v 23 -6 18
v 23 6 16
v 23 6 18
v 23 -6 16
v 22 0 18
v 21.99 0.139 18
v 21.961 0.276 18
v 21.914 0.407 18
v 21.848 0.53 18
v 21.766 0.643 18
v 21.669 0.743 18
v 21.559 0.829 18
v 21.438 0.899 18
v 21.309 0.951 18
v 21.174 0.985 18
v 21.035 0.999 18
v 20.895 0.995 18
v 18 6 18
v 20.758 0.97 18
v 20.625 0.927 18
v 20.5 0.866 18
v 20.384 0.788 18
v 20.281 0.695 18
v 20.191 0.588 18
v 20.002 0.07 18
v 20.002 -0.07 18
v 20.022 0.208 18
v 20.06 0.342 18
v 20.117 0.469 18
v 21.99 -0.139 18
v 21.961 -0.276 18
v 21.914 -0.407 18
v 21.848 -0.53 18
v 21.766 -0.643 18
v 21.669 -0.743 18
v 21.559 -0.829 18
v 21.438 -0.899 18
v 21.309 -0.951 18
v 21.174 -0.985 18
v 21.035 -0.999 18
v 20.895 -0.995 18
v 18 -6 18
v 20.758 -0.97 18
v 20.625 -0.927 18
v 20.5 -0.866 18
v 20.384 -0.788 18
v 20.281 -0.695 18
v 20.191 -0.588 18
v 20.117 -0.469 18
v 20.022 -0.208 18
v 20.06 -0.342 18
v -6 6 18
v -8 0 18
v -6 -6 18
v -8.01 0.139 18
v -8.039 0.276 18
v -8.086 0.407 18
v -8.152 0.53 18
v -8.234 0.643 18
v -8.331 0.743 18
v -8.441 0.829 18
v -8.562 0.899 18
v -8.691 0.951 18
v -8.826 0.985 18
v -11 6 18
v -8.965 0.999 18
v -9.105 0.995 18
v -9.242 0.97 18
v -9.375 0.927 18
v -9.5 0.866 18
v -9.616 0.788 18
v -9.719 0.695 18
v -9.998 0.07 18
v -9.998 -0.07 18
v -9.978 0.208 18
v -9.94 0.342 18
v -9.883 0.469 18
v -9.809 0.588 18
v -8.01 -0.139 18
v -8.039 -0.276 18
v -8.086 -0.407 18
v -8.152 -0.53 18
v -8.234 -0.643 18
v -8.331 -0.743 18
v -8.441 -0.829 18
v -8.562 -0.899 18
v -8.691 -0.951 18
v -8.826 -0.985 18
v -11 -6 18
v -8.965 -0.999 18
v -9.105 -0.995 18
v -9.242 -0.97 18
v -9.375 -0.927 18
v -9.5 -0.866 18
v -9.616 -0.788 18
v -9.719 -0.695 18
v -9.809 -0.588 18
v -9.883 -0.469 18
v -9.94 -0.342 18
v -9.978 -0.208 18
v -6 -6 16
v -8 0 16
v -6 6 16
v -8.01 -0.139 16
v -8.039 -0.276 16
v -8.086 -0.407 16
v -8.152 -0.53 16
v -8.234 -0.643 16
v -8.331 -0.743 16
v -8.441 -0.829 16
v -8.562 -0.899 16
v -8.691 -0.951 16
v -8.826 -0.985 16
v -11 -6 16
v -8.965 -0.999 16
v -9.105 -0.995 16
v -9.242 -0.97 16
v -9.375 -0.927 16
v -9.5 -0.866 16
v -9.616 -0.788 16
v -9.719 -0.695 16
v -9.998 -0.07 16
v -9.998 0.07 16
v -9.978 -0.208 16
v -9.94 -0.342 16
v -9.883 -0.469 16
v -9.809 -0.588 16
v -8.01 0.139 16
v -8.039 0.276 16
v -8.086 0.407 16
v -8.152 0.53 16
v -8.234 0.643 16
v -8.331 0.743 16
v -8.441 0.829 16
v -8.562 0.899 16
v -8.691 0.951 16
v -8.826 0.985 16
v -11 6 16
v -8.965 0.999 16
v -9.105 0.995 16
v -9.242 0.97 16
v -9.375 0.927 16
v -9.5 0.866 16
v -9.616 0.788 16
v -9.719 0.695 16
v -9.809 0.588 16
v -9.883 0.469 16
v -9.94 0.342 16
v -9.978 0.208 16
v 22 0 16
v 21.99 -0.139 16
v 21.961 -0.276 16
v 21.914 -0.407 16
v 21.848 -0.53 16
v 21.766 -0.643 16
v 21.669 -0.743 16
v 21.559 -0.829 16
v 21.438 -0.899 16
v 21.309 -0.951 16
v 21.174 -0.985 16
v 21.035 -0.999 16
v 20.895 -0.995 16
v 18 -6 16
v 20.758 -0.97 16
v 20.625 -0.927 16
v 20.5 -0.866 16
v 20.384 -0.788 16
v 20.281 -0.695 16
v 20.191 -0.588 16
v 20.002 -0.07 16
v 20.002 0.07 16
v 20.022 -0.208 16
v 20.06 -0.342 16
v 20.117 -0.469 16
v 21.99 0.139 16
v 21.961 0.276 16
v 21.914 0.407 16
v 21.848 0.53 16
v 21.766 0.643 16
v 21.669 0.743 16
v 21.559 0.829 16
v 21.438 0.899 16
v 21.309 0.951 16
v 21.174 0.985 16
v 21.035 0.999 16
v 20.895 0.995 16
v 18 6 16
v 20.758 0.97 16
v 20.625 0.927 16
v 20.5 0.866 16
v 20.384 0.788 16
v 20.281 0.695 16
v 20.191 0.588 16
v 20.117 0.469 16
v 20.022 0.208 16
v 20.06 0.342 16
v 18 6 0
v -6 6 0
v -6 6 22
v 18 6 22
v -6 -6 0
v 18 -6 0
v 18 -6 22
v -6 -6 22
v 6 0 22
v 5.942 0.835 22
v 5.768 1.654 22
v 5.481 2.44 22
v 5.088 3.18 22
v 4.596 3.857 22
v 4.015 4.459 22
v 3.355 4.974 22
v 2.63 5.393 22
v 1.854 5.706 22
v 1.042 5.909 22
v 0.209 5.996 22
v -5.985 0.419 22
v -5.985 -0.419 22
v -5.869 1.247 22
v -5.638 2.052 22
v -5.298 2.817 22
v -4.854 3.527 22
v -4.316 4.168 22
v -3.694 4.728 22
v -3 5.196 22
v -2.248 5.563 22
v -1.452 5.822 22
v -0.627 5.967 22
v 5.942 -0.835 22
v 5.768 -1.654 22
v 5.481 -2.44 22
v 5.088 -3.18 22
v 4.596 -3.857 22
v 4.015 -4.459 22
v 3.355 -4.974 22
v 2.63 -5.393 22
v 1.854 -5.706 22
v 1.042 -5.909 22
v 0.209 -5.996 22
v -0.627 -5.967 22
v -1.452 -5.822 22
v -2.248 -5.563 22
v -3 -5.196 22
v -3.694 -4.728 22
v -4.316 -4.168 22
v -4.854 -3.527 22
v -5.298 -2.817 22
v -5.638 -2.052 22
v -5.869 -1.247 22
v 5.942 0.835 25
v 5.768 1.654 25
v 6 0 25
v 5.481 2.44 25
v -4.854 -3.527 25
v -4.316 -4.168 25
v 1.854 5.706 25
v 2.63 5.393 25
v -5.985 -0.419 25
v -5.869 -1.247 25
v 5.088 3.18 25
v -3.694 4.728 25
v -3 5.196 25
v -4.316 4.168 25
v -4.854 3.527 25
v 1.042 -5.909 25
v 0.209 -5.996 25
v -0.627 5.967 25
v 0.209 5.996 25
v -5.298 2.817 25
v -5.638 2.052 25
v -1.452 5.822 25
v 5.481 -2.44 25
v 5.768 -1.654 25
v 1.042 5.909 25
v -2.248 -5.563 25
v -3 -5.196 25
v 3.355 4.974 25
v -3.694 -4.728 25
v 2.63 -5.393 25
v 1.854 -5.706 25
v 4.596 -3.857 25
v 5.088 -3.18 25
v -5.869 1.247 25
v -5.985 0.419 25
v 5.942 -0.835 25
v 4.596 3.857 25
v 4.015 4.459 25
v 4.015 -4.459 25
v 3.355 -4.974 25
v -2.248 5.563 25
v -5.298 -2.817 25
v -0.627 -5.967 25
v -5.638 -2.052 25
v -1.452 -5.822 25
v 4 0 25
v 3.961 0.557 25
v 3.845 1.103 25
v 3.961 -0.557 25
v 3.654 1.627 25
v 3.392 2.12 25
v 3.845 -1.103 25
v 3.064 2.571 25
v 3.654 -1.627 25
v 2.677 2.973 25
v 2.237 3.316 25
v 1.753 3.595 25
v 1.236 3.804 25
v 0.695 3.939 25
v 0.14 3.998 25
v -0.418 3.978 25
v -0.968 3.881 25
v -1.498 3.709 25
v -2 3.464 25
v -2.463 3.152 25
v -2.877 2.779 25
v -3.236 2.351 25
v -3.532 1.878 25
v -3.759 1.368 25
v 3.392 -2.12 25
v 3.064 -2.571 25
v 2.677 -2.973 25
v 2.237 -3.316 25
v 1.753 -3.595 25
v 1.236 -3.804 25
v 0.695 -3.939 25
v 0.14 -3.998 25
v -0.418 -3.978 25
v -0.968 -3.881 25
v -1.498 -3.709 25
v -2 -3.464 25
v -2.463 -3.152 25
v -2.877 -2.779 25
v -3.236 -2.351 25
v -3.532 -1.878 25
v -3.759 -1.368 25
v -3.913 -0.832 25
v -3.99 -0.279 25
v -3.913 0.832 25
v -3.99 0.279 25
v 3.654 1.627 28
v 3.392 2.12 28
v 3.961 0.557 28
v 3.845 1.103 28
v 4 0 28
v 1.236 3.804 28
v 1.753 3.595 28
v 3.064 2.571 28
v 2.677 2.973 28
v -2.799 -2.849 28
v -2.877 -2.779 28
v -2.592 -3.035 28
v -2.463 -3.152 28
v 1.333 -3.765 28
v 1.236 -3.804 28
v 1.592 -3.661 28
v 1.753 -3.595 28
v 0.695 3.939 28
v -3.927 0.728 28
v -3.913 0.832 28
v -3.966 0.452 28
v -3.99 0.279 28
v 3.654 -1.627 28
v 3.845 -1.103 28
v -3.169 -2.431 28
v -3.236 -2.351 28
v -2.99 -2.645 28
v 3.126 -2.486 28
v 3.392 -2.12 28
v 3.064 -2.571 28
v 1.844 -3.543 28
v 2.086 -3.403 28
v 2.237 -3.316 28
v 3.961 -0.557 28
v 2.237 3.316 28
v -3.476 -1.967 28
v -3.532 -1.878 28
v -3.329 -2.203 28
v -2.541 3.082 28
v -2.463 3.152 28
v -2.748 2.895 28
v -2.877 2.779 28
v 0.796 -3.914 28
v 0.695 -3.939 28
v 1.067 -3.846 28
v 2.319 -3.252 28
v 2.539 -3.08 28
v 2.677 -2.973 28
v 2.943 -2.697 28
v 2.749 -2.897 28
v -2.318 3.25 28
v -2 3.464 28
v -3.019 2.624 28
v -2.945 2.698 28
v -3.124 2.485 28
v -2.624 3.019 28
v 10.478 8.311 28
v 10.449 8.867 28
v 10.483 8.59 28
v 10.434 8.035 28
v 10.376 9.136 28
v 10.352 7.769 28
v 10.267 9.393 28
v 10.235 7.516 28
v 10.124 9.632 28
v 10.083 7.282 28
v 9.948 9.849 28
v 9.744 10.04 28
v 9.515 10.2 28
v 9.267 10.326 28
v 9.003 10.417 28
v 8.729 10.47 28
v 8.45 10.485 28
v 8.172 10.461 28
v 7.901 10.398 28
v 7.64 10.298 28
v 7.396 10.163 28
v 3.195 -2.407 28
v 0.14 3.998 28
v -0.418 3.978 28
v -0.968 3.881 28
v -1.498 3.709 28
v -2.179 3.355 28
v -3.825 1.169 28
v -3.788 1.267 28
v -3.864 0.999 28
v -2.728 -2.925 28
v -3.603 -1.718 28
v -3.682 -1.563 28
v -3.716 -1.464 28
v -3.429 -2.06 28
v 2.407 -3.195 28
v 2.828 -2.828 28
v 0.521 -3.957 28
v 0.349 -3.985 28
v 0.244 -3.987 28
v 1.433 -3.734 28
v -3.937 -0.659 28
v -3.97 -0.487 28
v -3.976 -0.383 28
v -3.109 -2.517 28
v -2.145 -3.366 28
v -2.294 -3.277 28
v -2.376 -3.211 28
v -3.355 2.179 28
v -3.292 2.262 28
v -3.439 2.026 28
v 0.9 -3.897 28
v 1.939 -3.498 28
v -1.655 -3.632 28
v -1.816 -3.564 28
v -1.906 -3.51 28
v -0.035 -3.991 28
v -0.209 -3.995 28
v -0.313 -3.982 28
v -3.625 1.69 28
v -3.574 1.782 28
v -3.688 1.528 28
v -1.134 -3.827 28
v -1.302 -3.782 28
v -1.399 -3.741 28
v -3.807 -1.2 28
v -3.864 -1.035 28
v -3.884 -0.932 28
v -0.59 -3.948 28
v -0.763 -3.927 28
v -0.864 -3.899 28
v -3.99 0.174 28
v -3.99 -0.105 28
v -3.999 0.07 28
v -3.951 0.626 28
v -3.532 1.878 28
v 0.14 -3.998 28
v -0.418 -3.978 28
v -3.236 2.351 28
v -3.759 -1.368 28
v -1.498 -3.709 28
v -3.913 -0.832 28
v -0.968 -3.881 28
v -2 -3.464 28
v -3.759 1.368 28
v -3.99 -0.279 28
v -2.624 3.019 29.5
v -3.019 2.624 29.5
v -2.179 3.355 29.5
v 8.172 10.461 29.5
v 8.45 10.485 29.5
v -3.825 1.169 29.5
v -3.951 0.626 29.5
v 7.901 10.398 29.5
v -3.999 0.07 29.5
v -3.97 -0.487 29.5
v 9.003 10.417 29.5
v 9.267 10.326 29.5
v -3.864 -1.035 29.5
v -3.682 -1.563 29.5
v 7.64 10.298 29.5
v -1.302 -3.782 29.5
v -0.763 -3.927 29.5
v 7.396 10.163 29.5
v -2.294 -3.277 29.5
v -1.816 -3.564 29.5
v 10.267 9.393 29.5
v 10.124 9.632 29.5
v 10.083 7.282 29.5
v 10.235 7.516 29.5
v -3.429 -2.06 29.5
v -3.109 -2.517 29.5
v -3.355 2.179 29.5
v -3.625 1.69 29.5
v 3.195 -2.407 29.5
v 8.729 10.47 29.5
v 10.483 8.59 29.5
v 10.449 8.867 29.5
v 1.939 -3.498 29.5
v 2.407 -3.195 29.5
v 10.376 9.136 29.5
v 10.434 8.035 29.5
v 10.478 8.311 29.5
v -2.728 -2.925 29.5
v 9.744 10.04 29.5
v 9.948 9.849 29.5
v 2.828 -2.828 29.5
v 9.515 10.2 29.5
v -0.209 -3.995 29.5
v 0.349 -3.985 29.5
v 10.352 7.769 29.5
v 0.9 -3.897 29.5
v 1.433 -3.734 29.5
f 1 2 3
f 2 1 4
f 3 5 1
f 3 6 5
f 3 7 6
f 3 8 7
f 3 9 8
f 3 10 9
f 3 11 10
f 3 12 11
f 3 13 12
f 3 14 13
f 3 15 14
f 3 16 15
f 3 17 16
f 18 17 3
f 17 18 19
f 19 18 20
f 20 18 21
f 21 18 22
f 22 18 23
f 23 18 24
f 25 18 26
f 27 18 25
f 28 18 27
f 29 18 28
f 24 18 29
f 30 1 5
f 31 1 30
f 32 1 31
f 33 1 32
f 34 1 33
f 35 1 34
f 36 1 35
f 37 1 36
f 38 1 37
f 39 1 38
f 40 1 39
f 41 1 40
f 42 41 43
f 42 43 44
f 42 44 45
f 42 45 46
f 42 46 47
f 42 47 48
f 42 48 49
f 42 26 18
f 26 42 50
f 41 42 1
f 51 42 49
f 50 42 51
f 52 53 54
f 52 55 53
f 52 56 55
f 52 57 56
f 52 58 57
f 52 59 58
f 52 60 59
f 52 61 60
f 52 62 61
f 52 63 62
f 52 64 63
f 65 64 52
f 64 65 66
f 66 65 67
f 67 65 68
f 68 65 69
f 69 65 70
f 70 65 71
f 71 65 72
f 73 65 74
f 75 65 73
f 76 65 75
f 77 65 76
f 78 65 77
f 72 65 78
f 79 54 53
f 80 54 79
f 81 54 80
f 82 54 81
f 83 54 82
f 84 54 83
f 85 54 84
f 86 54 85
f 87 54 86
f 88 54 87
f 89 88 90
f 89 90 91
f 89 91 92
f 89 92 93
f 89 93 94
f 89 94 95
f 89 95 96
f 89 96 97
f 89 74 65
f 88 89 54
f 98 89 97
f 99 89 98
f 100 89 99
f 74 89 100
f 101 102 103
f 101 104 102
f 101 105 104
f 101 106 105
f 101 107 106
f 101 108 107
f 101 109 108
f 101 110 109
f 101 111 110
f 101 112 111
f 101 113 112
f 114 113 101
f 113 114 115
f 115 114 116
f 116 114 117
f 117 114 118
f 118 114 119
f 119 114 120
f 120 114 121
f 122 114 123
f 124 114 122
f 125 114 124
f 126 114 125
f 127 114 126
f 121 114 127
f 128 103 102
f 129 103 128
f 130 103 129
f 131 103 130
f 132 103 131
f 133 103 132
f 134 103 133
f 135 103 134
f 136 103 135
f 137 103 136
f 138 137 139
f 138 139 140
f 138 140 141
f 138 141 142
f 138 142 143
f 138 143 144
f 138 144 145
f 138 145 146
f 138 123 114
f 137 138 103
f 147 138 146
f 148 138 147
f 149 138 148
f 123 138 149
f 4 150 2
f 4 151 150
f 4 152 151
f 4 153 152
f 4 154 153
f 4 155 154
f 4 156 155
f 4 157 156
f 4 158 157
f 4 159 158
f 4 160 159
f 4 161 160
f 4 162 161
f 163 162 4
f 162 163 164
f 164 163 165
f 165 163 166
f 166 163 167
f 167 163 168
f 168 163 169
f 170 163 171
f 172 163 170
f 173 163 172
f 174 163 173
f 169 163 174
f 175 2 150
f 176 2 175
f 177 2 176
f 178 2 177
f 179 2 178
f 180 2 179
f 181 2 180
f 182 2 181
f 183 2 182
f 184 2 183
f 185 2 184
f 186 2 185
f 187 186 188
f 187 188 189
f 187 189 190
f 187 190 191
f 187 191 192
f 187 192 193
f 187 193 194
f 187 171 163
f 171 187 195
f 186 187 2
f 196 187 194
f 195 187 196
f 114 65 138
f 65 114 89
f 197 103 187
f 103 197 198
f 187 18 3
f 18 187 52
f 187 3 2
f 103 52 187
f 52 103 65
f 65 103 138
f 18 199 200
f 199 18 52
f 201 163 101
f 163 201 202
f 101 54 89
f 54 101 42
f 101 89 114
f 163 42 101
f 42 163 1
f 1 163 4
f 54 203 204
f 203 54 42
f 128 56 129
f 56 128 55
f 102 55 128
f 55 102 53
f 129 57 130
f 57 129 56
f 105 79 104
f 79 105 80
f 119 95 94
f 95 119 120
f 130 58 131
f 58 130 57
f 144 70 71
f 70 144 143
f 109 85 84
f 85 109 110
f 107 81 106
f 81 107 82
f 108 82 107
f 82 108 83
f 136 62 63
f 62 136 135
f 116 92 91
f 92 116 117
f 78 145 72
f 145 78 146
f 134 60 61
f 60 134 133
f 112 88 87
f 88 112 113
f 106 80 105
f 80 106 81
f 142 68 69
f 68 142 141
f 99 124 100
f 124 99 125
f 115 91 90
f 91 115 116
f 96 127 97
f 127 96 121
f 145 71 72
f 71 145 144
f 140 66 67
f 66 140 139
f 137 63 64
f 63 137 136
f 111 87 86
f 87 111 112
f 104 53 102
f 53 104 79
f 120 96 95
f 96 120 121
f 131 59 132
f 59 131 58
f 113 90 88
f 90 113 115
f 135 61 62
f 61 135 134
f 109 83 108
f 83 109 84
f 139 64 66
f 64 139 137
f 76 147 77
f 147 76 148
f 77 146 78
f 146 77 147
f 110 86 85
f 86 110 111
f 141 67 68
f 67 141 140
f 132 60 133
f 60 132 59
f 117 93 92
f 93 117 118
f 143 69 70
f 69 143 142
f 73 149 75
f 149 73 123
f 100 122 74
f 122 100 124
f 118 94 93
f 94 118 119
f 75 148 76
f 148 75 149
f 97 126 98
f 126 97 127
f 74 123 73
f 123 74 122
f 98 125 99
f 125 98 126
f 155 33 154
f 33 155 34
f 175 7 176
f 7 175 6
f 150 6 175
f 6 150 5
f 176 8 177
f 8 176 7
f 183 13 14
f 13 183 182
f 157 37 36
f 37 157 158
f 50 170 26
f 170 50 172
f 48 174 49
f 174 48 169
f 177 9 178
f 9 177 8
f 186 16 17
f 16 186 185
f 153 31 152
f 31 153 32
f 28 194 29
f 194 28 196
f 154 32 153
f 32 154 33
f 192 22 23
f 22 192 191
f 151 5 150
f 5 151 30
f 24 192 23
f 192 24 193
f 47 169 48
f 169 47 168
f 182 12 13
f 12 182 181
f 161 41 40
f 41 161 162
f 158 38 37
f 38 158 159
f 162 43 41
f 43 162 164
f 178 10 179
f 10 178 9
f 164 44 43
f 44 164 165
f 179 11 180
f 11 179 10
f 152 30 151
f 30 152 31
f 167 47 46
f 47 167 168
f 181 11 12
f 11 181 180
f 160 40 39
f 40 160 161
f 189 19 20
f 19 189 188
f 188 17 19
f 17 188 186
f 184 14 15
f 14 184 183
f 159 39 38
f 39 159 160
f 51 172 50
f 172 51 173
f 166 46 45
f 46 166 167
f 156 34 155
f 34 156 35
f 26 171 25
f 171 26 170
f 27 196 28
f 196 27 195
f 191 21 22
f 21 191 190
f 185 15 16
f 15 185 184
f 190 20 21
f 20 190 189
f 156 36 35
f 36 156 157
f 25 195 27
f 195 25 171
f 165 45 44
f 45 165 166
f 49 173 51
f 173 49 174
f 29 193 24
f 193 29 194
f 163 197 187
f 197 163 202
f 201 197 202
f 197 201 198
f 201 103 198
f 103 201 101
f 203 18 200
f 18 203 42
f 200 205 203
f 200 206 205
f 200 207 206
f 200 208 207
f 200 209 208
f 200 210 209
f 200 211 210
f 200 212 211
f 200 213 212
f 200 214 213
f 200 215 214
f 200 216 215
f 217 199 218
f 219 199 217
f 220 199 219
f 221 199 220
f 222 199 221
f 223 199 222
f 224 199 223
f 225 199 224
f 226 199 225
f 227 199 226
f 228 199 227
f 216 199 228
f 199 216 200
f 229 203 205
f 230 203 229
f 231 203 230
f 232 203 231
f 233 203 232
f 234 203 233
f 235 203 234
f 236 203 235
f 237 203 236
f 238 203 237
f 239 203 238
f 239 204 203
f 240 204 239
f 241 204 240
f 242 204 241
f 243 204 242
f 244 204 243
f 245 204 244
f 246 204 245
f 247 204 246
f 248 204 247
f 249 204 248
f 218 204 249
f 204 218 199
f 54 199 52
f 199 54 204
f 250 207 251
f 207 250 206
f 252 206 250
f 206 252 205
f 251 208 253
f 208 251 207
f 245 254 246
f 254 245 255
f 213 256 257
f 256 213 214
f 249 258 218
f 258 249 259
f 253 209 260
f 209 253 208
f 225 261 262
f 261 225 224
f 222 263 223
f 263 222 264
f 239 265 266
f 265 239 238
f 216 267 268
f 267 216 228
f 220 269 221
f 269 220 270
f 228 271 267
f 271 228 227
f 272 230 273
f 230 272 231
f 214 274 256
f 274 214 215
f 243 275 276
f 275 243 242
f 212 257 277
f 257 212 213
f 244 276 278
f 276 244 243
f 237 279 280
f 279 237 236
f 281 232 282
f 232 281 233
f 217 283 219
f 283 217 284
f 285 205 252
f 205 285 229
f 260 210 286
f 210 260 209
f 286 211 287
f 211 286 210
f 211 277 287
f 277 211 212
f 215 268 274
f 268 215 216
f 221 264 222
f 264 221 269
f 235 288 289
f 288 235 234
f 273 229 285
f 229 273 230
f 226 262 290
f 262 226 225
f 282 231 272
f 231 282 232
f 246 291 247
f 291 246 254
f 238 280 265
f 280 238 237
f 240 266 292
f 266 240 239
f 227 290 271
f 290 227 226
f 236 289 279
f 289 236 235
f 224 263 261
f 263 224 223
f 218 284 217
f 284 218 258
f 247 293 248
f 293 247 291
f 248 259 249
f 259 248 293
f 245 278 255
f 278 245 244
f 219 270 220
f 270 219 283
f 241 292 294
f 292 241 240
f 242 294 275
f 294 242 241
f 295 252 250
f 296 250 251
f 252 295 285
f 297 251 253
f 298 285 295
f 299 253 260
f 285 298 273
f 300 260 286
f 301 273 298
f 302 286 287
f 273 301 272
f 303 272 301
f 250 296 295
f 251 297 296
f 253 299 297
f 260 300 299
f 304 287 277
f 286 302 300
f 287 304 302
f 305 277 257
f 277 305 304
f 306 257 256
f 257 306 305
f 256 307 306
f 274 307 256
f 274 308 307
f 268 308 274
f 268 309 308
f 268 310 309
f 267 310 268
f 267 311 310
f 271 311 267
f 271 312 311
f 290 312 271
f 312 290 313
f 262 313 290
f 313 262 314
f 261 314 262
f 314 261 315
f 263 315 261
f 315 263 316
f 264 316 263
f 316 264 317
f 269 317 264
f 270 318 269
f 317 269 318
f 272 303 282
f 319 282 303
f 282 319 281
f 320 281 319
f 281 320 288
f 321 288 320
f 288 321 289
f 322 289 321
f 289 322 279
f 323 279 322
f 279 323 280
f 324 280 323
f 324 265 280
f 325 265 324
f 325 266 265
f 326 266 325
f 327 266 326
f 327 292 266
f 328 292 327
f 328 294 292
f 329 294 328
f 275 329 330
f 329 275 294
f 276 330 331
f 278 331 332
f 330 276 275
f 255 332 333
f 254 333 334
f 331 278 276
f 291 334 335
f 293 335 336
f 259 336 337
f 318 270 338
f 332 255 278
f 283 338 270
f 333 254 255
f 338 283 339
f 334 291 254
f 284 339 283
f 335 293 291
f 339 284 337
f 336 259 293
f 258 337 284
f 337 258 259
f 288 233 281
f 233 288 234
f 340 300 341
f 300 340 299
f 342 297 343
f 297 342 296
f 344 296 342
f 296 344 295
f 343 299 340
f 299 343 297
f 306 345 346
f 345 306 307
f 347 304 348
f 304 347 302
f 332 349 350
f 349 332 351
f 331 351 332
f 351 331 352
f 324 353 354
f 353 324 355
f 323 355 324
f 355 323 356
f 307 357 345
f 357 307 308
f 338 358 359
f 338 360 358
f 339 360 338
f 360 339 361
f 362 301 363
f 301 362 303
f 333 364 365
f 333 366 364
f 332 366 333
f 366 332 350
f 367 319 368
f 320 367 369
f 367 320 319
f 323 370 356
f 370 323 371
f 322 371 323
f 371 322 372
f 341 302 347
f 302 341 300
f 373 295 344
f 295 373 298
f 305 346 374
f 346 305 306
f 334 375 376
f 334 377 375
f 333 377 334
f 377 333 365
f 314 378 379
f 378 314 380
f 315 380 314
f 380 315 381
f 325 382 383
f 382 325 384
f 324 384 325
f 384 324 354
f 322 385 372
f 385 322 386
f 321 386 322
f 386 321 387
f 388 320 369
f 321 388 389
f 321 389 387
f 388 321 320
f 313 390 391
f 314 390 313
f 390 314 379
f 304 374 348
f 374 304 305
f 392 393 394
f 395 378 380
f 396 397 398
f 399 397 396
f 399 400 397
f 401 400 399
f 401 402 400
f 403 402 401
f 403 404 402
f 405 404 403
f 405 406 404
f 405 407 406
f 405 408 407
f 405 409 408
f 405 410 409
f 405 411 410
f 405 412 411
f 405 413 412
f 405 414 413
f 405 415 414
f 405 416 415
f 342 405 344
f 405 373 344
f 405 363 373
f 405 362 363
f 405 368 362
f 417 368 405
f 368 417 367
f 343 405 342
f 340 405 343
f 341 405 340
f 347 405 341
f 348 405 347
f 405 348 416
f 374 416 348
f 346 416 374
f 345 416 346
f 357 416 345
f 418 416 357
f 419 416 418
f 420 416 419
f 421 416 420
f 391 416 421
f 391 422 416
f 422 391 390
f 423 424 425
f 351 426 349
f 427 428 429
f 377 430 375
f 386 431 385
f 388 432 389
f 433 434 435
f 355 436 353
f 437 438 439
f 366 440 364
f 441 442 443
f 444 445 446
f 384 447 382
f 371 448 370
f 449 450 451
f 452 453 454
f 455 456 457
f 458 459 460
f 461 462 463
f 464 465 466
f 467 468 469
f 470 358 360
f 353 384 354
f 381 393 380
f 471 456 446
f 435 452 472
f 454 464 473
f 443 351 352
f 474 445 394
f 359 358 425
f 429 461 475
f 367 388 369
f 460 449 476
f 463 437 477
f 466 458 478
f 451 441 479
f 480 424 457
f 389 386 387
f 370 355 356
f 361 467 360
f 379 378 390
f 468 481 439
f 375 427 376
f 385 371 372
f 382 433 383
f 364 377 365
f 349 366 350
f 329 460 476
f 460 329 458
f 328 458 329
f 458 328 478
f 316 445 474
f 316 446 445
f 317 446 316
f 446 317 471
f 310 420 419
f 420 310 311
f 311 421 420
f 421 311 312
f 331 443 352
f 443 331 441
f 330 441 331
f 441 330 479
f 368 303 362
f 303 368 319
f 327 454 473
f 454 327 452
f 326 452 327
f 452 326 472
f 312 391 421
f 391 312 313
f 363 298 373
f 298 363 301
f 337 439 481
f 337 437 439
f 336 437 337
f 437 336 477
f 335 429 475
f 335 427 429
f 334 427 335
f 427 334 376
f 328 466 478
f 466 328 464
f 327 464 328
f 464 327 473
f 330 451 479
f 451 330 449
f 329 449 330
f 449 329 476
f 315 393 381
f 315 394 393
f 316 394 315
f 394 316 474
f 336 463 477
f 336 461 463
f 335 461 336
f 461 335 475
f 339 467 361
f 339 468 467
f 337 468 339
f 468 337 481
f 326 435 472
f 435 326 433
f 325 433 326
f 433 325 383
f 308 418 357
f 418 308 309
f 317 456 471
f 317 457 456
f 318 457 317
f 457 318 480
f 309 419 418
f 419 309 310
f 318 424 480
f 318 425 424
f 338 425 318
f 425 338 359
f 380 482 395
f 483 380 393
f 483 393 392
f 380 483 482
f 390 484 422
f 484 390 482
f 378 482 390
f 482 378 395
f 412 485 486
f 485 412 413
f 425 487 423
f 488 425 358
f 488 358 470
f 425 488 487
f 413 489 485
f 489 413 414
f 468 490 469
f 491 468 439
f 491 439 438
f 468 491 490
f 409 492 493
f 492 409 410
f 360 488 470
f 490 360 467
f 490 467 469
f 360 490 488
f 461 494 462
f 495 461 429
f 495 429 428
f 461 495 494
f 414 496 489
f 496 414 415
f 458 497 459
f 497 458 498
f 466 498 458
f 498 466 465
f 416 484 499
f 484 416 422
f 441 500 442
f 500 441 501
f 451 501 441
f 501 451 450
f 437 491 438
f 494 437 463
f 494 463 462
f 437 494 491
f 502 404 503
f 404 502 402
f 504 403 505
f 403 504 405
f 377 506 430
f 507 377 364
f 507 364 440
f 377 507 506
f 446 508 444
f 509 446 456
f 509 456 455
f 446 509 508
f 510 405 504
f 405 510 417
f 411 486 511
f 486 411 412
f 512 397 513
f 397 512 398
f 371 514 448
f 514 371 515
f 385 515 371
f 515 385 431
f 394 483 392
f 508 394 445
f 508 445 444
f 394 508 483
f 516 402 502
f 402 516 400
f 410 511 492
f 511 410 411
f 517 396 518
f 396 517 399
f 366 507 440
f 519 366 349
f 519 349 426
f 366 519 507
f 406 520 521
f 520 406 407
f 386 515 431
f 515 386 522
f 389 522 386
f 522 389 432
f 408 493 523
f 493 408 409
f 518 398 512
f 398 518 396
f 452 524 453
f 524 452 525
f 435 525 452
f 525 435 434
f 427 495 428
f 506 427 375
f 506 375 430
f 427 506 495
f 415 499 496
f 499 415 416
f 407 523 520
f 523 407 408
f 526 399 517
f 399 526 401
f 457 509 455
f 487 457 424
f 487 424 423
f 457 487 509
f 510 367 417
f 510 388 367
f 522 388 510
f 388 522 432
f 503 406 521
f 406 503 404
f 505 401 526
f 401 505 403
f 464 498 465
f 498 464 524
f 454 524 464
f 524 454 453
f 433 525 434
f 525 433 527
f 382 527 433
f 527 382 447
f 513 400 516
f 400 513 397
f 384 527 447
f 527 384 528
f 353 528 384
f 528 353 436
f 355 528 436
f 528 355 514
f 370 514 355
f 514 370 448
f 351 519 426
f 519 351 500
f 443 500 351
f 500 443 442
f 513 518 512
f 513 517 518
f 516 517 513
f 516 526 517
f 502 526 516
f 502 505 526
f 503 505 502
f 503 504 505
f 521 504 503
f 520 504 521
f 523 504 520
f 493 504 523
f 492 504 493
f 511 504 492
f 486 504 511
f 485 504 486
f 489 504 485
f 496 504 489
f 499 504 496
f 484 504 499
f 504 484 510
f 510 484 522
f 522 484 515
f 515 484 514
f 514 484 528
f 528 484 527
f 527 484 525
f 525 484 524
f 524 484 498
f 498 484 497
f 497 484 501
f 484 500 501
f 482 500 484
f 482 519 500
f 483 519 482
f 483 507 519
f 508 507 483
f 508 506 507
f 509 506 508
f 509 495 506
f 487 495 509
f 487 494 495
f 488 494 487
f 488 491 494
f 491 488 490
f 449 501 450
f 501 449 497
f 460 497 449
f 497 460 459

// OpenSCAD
// Fictional servo with arm for drawings
dim_l = [24, 12, 16];
dim_m = [34, dim_l.y, 2];
dim_u = [dim_l.x, dim_l.y, 4];

pos_l = [-6, -dim_l.y/2, 0];
pos_m = pos_l + [-(dim_m.x-dim_l.x)/2, 0, dim_l.z];
pos_u = pos_l + [0, 0, dim_l.z+dim_m.z];

dome_h = pos_u.z + dim_u.z + 3;
dome_d = dim_l.y;

spline_h = dome_h + 3;
spline_d = 8;

hole_d = 2;
hole_h = dome_h;
hole_x = 2;

servo_z = spline_h;

servo();
color("orange") rotate([0, 0, -45]) translate([0, 0, servo_z]) servo_arm();

module servo() {
    // Lower case
    translate(pos_l) cube(dim_l);
    
    // Mounting plate
    difference() {
        translate(pos_m) cube(dim_m);
        translate([pos_m.x+hole_x, 0, 0]) cylinder(d=hole_d, h=hole_h, $fn=45);
        translate([pos_m.x+dim_m.x-hole_x, 0, 0]) cylinder(d=hole_d, h=hole_h, $fn=45);
    }
    
    // Upper case
    translate(pos_u) cube(dim_u);
    
    // Large dome
    cylinder(d=dome_d, h=dome_h, $fn=45);
    
    // Spline
    cylinder(d=spline_d, h=spline_h, $fn=45);
}

module servo_arm() {
    h = 1.5;
    d1 = 8;
    d2 = 4;
    l = 12;

    hull() {
        cylinder(d=d1, h=h, $fn=45);
        translate([0, l, 0]) cylinder(d=d2, h=h, $fn=45);
    }

}
